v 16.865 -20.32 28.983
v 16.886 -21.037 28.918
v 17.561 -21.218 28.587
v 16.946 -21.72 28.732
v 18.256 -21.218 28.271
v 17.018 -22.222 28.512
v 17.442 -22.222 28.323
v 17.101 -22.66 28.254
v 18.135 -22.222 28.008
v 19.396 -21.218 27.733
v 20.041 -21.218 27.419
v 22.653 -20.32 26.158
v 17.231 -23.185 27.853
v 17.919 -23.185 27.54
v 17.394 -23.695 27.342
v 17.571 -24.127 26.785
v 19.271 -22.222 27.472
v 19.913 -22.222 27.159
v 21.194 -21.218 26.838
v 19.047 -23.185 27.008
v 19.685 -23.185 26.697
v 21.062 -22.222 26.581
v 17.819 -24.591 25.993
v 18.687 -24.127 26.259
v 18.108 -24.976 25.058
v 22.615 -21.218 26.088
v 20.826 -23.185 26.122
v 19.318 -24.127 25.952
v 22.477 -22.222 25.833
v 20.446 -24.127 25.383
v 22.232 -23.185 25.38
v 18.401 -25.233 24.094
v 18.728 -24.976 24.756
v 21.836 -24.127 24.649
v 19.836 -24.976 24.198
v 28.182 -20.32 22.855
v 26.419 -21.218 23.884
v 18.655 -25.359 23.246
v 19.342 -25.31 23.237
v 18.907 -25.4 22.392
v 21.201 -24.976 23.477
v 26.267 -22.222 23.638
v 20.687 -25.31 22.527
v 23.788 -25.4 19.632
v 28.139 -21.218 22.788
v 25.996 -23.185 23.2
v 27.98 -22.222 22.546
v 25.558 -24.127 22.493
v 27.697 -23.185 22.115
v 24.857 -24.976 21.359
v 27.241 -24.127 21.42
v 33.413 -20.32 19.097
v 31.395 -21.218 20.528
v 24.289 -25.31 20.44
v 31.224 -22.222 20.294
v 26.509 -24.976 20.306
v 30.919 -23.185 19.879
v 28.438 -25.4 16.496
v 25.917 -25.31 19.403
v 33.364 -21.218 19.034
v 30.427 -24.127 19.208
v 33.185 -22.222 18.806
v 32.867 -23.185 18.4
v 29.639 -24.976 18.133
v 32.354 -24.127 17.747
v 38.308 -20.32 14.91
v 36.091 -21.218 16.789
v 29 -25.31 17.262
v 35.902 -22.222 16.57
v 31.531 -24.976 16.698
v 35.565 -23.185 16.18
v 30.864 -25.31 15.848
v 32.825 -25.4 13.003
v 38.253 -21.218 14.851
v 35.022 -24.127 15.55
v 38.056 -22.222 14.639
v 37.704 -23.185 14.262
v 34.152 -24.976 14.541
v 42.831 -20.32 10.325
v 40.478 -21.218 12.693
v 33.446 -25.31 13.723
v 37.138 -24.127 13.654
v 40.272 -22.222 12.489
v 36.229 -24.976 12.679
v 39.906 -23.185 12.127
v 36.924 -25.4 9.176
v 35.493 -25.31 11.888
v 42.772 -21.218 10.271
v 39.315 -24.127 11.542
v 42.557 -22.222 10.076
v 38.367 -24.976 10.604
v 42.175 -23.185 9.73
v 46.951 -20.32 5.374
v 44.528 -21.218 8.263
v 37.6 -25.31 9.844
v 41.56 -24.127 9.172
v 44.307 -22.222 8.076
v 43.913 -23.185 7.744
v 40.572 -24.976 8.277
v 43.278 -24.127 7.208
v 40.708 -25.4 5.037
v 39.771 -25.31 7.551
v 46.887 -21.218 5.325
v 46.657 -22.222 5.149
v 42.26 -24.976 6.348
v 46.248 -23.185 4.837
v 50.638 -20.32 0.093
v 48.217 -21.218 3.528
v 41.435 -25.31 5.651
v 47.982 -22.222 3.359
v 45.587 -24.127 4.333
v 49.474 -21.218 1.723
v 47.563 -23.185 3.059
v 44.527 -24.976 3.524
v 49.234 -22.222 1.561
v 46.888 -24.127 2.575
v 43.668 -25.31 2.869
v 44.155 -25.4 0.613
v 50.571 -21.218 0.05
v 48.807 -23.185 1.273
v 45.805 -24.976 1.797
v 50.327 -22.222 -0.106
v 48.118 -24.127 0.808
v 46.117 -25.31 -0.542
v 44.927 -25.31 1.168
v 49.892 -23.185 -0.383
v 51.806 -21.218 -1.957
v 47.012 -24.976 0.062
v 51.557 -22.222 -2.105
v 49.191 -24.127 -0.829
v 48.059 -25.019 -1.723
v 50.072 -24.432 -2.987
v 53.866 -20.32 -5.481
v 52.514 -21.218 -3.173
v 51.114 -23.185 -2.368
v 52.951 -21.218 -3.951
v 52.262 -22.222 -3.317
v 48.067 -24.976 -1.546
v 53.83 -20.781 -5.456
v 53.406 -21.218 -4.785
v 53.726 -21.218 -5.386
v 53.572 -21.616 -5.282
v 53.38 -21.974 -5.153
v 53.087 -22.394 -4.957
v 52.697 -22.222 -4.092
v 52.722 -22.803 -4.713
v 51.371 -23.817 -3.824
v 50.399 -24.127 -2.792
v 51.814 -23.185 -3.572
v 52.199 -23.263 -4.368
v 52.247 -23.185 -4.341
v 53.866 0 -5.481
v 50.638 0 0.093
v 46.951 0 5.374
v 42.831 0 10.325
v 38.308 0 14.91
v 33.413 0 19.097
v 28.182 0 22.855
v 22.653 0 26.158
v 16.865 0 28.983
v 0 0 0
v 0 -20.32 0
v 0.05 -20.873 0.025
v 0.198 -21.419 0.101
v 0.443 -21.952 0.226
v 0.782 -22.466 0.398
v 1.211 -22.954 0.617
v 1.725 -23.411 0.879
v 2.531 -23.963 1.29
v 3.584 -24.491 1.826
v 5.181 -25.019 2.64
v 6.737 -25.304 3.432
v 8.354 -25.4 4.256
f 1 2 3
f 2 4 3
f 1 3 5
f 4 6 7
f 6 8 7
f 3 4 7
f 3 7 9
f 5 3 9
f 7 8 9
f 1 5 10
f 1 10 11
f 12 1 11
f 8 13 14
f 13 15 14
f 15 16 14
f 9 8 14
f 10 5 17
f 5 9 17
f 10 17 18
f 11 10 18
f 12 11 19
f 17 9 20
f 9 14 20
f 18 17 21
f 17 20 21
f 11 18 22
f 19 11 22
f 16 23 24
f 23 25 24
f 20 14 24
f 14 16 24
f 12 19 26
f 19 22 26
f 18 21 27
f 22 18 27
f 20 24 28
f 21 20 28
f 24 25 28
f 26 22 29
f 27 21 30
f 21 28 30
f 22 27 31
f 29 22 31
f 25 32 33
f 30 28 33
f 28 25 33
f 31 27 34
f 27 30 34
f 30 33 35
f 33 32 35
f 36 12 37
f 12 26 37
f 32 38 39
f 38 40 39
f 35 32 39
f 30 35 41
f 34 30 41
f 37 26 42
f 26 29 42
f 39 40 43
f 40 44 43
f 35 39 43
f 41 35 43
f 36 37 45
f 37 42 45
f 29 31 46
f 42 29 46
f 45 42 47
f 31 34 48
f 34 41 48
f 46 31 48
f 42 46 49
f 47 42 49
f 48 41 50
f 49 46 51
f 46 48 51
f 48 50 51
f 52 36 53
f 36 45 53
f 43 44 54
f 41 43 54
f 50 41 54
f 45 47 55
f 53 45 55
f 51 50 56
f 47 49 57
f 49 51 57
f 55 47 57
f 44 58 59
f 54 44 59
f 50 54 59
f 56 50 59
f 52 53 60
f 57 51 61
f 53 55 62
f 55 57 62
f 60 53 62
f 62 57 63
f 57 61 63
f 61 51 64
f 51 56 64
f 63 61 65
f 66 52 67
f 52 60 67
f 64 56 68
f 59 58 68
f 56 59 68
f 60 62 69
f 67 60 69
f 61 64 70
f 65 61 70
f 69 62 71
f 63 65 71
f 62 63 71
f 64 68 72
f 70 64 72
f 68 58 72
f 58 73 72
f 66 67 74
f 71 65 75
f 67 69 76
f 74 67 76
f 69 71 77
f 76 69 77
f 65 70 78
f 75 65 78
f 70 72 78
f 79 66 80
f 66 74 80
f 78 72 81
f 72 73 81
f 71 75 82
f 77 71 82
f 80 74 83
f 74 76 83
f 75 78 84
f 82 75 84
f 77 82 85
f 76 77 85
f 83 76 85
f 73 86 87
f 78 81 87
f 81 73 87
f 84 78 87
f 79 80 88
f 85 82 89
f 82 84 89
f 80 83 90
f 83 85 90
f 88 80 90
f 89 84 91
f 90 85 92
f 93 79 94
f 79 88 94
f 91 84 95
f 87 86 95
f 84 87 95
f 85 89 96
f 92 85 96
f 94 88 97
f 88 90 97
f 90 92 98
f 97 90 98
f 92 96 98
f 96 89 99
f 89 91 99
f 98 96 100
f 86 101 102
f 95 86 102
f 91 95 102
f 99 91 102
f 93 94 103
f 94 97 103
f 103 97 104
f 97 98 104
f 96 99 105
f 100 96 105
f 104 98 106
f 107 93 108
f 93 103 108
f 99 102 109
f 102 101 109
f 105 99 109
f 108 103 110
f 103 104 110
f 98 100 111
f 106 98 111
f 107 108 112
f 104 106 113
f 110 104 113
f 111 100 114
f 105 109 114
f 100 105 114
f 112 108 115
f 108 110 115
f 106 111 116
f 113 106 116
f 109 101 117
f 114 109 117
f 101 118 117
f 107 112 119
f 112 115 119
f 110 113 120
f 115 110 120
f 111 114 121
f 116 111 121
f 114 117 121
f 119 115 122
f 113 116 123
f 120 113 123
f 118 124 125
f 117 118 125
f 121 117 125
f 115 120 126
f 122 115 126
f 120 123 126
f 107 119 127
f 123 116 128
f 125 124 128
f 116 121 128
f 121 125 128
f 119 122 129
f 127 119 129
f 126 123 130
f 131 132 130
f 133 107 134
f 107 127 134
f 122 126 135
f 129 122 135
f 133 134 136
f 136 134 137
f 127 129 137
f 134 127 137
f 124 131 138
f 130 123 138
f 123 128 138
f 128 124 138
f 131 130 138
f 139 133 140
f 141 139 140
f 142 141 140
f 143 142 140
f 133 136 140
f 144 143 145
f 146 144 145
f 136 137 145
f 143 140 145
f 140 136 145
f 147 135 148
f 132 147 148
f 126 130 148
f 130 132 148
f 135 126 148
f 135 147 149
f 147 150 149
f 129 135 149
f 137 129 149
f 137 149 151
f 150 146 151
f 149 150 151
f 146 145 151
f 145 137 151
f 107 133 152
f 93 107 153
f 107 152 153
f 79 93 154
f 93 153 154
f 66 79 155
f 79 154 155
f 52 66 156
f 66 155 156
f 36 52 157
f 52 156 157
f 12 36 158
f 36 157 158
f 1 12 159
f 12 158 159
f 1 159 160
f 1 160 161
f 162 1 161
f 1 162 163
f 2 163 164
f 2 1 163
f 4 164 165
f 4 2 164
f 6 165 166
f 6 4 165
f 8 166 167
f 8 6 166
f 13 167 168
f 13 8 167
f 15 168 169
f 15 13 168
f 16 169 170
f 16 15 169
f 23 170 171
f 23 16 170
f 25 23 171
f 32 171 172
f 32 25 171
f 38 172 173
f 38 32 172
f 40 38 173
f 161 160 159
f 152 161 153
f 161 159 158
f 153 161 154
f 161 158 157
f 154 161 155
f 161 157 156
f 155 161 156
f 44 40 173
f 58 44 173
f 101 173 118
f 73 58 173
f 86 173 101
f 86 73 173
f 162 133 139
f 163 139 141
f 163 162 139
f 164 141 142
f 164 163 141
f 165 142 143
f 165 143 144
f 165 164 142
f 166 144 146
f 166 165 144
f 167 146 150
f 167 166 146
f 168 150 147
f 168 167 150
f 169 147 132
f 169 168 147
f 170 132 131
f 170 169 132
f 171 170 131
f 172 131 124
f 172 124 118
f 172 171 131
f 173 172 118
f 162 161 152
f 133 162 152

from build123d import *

# Parameters (mm, degrees)
F1_DEPTH    = 25.4
F2_T1_DEPTH = 355.0052962601
F3_T1_DEPTH = 79.5444841249
F3_T3_DEPTH = 58.9324911013
F3_T6_ANGLE = 57.8558117321


# Not quite as in the source:
# - a fillet or chamfer that OpenCascade refuses, or shapes differently, is made with other operations: its cross-section is extruded or revolved along the edge and cut away or added


with BuildPart() as f1:
    # F0 (on Front) → F1 (new body)
    with BuildSketch(Plane.XZ):
        Polygon((16.8645065278, 28.9830360562), (0, 0), (62.5720471144, -6.3669001684), (62.5720471144, 25.0710807741), align=None)
    extrude(amount=F1_DEPTH)

    # F2: fillet of radius 76.2 on 1 edges, made by hand

    # F2_s2 → F2_t1 (cut)
    with BuildSketch(Plane.XZ.offset(-164.8026481301)):
        with BuildLine():
            ThreePointArc((62.5720471144, -40.849978478), (50.1292639894, 0.8807930983), (16.8645065278, 28.9830360562))
            Line((16.8645065278, 28.9830360562), (62.5720471144, 25.0710807741))
            Line((62.5720471144, 25.0710807741), (62.5720471144, -40.849978478))
        make_face()
    extrude(amount=F2_T1_DEPTH, mode=Mode.SUBTRACT)

    # F3: fillet of radius 5.08 on 3 edges, made by hand

    # F3_s2 → F3_t1 (cut)
    with BuildSketch(Plane(origin=(-12.6347602087, 0, 1.2856261), x_dir=(0, 1, 0), z_dir=(0.9948630086, 0, -0.1012304016))):
        with BuildLine():
            ThreePointArc((-20.32, 0), (-23.9121024484, 1.4878975516), (-25.4, 5.08))
            Line((-25.4, 5.08), (-25.4, 0))
            Line((-25.4, 0), (-20.32, 0))
        make_face()
    extrude(amount=F3_T1_DEPTH, mode=Mode.SUBTRACT)

    # F3_s4 → F3_t3 (cut)
    with BuildSketch(Plane(origin=(23.2517216099, 0, 39.9599884335), x_dir=(0, 1, 0), z_dir=(-0.5029303214, 0, -0.8643269588))):
        with BuildLine():
            ThreePointArc((-20.32, 0), (-23.9121024484, 1.4878975516), (-25.4, 5.08))
            Line((-25.4, 5.08), (-25.4, 0))
            Line((-25.4, 0), (-20.32, 0))
        make_face()
    extrude(amount=F3_T3_DEPTH, mode=Mode.SUBTRACT)

    # F3_s5 → F3_t6 (revolve, cut)
    with BuildSketch(Plane(origin=(-3.2129562092, 0, 0.8033671188), x_dir=(0, 1, 0), z_dir=(-0.9701334009, 0, 0.2425720192))):
        with BuildLine():
            ThreePointArc((-20.32, -33.2643114045), (-23.9121024484, -31.776413853), (-25.4, -28.1843114045))
            Line((-25.4, -28.1843114045), (-25.4, -33.2643114045))
            Line((-25.4, -33.2643114045), (-20.32, -33.2643114045))
        make_face()
    revolve(axis=Axis((-13.6279528859, -25.4, -40.8499784781), (0, 1, 0)), revolution_arc=F3_T6_ANGLE, mode=Mode.SUBTRACT)


solid = f1.part
